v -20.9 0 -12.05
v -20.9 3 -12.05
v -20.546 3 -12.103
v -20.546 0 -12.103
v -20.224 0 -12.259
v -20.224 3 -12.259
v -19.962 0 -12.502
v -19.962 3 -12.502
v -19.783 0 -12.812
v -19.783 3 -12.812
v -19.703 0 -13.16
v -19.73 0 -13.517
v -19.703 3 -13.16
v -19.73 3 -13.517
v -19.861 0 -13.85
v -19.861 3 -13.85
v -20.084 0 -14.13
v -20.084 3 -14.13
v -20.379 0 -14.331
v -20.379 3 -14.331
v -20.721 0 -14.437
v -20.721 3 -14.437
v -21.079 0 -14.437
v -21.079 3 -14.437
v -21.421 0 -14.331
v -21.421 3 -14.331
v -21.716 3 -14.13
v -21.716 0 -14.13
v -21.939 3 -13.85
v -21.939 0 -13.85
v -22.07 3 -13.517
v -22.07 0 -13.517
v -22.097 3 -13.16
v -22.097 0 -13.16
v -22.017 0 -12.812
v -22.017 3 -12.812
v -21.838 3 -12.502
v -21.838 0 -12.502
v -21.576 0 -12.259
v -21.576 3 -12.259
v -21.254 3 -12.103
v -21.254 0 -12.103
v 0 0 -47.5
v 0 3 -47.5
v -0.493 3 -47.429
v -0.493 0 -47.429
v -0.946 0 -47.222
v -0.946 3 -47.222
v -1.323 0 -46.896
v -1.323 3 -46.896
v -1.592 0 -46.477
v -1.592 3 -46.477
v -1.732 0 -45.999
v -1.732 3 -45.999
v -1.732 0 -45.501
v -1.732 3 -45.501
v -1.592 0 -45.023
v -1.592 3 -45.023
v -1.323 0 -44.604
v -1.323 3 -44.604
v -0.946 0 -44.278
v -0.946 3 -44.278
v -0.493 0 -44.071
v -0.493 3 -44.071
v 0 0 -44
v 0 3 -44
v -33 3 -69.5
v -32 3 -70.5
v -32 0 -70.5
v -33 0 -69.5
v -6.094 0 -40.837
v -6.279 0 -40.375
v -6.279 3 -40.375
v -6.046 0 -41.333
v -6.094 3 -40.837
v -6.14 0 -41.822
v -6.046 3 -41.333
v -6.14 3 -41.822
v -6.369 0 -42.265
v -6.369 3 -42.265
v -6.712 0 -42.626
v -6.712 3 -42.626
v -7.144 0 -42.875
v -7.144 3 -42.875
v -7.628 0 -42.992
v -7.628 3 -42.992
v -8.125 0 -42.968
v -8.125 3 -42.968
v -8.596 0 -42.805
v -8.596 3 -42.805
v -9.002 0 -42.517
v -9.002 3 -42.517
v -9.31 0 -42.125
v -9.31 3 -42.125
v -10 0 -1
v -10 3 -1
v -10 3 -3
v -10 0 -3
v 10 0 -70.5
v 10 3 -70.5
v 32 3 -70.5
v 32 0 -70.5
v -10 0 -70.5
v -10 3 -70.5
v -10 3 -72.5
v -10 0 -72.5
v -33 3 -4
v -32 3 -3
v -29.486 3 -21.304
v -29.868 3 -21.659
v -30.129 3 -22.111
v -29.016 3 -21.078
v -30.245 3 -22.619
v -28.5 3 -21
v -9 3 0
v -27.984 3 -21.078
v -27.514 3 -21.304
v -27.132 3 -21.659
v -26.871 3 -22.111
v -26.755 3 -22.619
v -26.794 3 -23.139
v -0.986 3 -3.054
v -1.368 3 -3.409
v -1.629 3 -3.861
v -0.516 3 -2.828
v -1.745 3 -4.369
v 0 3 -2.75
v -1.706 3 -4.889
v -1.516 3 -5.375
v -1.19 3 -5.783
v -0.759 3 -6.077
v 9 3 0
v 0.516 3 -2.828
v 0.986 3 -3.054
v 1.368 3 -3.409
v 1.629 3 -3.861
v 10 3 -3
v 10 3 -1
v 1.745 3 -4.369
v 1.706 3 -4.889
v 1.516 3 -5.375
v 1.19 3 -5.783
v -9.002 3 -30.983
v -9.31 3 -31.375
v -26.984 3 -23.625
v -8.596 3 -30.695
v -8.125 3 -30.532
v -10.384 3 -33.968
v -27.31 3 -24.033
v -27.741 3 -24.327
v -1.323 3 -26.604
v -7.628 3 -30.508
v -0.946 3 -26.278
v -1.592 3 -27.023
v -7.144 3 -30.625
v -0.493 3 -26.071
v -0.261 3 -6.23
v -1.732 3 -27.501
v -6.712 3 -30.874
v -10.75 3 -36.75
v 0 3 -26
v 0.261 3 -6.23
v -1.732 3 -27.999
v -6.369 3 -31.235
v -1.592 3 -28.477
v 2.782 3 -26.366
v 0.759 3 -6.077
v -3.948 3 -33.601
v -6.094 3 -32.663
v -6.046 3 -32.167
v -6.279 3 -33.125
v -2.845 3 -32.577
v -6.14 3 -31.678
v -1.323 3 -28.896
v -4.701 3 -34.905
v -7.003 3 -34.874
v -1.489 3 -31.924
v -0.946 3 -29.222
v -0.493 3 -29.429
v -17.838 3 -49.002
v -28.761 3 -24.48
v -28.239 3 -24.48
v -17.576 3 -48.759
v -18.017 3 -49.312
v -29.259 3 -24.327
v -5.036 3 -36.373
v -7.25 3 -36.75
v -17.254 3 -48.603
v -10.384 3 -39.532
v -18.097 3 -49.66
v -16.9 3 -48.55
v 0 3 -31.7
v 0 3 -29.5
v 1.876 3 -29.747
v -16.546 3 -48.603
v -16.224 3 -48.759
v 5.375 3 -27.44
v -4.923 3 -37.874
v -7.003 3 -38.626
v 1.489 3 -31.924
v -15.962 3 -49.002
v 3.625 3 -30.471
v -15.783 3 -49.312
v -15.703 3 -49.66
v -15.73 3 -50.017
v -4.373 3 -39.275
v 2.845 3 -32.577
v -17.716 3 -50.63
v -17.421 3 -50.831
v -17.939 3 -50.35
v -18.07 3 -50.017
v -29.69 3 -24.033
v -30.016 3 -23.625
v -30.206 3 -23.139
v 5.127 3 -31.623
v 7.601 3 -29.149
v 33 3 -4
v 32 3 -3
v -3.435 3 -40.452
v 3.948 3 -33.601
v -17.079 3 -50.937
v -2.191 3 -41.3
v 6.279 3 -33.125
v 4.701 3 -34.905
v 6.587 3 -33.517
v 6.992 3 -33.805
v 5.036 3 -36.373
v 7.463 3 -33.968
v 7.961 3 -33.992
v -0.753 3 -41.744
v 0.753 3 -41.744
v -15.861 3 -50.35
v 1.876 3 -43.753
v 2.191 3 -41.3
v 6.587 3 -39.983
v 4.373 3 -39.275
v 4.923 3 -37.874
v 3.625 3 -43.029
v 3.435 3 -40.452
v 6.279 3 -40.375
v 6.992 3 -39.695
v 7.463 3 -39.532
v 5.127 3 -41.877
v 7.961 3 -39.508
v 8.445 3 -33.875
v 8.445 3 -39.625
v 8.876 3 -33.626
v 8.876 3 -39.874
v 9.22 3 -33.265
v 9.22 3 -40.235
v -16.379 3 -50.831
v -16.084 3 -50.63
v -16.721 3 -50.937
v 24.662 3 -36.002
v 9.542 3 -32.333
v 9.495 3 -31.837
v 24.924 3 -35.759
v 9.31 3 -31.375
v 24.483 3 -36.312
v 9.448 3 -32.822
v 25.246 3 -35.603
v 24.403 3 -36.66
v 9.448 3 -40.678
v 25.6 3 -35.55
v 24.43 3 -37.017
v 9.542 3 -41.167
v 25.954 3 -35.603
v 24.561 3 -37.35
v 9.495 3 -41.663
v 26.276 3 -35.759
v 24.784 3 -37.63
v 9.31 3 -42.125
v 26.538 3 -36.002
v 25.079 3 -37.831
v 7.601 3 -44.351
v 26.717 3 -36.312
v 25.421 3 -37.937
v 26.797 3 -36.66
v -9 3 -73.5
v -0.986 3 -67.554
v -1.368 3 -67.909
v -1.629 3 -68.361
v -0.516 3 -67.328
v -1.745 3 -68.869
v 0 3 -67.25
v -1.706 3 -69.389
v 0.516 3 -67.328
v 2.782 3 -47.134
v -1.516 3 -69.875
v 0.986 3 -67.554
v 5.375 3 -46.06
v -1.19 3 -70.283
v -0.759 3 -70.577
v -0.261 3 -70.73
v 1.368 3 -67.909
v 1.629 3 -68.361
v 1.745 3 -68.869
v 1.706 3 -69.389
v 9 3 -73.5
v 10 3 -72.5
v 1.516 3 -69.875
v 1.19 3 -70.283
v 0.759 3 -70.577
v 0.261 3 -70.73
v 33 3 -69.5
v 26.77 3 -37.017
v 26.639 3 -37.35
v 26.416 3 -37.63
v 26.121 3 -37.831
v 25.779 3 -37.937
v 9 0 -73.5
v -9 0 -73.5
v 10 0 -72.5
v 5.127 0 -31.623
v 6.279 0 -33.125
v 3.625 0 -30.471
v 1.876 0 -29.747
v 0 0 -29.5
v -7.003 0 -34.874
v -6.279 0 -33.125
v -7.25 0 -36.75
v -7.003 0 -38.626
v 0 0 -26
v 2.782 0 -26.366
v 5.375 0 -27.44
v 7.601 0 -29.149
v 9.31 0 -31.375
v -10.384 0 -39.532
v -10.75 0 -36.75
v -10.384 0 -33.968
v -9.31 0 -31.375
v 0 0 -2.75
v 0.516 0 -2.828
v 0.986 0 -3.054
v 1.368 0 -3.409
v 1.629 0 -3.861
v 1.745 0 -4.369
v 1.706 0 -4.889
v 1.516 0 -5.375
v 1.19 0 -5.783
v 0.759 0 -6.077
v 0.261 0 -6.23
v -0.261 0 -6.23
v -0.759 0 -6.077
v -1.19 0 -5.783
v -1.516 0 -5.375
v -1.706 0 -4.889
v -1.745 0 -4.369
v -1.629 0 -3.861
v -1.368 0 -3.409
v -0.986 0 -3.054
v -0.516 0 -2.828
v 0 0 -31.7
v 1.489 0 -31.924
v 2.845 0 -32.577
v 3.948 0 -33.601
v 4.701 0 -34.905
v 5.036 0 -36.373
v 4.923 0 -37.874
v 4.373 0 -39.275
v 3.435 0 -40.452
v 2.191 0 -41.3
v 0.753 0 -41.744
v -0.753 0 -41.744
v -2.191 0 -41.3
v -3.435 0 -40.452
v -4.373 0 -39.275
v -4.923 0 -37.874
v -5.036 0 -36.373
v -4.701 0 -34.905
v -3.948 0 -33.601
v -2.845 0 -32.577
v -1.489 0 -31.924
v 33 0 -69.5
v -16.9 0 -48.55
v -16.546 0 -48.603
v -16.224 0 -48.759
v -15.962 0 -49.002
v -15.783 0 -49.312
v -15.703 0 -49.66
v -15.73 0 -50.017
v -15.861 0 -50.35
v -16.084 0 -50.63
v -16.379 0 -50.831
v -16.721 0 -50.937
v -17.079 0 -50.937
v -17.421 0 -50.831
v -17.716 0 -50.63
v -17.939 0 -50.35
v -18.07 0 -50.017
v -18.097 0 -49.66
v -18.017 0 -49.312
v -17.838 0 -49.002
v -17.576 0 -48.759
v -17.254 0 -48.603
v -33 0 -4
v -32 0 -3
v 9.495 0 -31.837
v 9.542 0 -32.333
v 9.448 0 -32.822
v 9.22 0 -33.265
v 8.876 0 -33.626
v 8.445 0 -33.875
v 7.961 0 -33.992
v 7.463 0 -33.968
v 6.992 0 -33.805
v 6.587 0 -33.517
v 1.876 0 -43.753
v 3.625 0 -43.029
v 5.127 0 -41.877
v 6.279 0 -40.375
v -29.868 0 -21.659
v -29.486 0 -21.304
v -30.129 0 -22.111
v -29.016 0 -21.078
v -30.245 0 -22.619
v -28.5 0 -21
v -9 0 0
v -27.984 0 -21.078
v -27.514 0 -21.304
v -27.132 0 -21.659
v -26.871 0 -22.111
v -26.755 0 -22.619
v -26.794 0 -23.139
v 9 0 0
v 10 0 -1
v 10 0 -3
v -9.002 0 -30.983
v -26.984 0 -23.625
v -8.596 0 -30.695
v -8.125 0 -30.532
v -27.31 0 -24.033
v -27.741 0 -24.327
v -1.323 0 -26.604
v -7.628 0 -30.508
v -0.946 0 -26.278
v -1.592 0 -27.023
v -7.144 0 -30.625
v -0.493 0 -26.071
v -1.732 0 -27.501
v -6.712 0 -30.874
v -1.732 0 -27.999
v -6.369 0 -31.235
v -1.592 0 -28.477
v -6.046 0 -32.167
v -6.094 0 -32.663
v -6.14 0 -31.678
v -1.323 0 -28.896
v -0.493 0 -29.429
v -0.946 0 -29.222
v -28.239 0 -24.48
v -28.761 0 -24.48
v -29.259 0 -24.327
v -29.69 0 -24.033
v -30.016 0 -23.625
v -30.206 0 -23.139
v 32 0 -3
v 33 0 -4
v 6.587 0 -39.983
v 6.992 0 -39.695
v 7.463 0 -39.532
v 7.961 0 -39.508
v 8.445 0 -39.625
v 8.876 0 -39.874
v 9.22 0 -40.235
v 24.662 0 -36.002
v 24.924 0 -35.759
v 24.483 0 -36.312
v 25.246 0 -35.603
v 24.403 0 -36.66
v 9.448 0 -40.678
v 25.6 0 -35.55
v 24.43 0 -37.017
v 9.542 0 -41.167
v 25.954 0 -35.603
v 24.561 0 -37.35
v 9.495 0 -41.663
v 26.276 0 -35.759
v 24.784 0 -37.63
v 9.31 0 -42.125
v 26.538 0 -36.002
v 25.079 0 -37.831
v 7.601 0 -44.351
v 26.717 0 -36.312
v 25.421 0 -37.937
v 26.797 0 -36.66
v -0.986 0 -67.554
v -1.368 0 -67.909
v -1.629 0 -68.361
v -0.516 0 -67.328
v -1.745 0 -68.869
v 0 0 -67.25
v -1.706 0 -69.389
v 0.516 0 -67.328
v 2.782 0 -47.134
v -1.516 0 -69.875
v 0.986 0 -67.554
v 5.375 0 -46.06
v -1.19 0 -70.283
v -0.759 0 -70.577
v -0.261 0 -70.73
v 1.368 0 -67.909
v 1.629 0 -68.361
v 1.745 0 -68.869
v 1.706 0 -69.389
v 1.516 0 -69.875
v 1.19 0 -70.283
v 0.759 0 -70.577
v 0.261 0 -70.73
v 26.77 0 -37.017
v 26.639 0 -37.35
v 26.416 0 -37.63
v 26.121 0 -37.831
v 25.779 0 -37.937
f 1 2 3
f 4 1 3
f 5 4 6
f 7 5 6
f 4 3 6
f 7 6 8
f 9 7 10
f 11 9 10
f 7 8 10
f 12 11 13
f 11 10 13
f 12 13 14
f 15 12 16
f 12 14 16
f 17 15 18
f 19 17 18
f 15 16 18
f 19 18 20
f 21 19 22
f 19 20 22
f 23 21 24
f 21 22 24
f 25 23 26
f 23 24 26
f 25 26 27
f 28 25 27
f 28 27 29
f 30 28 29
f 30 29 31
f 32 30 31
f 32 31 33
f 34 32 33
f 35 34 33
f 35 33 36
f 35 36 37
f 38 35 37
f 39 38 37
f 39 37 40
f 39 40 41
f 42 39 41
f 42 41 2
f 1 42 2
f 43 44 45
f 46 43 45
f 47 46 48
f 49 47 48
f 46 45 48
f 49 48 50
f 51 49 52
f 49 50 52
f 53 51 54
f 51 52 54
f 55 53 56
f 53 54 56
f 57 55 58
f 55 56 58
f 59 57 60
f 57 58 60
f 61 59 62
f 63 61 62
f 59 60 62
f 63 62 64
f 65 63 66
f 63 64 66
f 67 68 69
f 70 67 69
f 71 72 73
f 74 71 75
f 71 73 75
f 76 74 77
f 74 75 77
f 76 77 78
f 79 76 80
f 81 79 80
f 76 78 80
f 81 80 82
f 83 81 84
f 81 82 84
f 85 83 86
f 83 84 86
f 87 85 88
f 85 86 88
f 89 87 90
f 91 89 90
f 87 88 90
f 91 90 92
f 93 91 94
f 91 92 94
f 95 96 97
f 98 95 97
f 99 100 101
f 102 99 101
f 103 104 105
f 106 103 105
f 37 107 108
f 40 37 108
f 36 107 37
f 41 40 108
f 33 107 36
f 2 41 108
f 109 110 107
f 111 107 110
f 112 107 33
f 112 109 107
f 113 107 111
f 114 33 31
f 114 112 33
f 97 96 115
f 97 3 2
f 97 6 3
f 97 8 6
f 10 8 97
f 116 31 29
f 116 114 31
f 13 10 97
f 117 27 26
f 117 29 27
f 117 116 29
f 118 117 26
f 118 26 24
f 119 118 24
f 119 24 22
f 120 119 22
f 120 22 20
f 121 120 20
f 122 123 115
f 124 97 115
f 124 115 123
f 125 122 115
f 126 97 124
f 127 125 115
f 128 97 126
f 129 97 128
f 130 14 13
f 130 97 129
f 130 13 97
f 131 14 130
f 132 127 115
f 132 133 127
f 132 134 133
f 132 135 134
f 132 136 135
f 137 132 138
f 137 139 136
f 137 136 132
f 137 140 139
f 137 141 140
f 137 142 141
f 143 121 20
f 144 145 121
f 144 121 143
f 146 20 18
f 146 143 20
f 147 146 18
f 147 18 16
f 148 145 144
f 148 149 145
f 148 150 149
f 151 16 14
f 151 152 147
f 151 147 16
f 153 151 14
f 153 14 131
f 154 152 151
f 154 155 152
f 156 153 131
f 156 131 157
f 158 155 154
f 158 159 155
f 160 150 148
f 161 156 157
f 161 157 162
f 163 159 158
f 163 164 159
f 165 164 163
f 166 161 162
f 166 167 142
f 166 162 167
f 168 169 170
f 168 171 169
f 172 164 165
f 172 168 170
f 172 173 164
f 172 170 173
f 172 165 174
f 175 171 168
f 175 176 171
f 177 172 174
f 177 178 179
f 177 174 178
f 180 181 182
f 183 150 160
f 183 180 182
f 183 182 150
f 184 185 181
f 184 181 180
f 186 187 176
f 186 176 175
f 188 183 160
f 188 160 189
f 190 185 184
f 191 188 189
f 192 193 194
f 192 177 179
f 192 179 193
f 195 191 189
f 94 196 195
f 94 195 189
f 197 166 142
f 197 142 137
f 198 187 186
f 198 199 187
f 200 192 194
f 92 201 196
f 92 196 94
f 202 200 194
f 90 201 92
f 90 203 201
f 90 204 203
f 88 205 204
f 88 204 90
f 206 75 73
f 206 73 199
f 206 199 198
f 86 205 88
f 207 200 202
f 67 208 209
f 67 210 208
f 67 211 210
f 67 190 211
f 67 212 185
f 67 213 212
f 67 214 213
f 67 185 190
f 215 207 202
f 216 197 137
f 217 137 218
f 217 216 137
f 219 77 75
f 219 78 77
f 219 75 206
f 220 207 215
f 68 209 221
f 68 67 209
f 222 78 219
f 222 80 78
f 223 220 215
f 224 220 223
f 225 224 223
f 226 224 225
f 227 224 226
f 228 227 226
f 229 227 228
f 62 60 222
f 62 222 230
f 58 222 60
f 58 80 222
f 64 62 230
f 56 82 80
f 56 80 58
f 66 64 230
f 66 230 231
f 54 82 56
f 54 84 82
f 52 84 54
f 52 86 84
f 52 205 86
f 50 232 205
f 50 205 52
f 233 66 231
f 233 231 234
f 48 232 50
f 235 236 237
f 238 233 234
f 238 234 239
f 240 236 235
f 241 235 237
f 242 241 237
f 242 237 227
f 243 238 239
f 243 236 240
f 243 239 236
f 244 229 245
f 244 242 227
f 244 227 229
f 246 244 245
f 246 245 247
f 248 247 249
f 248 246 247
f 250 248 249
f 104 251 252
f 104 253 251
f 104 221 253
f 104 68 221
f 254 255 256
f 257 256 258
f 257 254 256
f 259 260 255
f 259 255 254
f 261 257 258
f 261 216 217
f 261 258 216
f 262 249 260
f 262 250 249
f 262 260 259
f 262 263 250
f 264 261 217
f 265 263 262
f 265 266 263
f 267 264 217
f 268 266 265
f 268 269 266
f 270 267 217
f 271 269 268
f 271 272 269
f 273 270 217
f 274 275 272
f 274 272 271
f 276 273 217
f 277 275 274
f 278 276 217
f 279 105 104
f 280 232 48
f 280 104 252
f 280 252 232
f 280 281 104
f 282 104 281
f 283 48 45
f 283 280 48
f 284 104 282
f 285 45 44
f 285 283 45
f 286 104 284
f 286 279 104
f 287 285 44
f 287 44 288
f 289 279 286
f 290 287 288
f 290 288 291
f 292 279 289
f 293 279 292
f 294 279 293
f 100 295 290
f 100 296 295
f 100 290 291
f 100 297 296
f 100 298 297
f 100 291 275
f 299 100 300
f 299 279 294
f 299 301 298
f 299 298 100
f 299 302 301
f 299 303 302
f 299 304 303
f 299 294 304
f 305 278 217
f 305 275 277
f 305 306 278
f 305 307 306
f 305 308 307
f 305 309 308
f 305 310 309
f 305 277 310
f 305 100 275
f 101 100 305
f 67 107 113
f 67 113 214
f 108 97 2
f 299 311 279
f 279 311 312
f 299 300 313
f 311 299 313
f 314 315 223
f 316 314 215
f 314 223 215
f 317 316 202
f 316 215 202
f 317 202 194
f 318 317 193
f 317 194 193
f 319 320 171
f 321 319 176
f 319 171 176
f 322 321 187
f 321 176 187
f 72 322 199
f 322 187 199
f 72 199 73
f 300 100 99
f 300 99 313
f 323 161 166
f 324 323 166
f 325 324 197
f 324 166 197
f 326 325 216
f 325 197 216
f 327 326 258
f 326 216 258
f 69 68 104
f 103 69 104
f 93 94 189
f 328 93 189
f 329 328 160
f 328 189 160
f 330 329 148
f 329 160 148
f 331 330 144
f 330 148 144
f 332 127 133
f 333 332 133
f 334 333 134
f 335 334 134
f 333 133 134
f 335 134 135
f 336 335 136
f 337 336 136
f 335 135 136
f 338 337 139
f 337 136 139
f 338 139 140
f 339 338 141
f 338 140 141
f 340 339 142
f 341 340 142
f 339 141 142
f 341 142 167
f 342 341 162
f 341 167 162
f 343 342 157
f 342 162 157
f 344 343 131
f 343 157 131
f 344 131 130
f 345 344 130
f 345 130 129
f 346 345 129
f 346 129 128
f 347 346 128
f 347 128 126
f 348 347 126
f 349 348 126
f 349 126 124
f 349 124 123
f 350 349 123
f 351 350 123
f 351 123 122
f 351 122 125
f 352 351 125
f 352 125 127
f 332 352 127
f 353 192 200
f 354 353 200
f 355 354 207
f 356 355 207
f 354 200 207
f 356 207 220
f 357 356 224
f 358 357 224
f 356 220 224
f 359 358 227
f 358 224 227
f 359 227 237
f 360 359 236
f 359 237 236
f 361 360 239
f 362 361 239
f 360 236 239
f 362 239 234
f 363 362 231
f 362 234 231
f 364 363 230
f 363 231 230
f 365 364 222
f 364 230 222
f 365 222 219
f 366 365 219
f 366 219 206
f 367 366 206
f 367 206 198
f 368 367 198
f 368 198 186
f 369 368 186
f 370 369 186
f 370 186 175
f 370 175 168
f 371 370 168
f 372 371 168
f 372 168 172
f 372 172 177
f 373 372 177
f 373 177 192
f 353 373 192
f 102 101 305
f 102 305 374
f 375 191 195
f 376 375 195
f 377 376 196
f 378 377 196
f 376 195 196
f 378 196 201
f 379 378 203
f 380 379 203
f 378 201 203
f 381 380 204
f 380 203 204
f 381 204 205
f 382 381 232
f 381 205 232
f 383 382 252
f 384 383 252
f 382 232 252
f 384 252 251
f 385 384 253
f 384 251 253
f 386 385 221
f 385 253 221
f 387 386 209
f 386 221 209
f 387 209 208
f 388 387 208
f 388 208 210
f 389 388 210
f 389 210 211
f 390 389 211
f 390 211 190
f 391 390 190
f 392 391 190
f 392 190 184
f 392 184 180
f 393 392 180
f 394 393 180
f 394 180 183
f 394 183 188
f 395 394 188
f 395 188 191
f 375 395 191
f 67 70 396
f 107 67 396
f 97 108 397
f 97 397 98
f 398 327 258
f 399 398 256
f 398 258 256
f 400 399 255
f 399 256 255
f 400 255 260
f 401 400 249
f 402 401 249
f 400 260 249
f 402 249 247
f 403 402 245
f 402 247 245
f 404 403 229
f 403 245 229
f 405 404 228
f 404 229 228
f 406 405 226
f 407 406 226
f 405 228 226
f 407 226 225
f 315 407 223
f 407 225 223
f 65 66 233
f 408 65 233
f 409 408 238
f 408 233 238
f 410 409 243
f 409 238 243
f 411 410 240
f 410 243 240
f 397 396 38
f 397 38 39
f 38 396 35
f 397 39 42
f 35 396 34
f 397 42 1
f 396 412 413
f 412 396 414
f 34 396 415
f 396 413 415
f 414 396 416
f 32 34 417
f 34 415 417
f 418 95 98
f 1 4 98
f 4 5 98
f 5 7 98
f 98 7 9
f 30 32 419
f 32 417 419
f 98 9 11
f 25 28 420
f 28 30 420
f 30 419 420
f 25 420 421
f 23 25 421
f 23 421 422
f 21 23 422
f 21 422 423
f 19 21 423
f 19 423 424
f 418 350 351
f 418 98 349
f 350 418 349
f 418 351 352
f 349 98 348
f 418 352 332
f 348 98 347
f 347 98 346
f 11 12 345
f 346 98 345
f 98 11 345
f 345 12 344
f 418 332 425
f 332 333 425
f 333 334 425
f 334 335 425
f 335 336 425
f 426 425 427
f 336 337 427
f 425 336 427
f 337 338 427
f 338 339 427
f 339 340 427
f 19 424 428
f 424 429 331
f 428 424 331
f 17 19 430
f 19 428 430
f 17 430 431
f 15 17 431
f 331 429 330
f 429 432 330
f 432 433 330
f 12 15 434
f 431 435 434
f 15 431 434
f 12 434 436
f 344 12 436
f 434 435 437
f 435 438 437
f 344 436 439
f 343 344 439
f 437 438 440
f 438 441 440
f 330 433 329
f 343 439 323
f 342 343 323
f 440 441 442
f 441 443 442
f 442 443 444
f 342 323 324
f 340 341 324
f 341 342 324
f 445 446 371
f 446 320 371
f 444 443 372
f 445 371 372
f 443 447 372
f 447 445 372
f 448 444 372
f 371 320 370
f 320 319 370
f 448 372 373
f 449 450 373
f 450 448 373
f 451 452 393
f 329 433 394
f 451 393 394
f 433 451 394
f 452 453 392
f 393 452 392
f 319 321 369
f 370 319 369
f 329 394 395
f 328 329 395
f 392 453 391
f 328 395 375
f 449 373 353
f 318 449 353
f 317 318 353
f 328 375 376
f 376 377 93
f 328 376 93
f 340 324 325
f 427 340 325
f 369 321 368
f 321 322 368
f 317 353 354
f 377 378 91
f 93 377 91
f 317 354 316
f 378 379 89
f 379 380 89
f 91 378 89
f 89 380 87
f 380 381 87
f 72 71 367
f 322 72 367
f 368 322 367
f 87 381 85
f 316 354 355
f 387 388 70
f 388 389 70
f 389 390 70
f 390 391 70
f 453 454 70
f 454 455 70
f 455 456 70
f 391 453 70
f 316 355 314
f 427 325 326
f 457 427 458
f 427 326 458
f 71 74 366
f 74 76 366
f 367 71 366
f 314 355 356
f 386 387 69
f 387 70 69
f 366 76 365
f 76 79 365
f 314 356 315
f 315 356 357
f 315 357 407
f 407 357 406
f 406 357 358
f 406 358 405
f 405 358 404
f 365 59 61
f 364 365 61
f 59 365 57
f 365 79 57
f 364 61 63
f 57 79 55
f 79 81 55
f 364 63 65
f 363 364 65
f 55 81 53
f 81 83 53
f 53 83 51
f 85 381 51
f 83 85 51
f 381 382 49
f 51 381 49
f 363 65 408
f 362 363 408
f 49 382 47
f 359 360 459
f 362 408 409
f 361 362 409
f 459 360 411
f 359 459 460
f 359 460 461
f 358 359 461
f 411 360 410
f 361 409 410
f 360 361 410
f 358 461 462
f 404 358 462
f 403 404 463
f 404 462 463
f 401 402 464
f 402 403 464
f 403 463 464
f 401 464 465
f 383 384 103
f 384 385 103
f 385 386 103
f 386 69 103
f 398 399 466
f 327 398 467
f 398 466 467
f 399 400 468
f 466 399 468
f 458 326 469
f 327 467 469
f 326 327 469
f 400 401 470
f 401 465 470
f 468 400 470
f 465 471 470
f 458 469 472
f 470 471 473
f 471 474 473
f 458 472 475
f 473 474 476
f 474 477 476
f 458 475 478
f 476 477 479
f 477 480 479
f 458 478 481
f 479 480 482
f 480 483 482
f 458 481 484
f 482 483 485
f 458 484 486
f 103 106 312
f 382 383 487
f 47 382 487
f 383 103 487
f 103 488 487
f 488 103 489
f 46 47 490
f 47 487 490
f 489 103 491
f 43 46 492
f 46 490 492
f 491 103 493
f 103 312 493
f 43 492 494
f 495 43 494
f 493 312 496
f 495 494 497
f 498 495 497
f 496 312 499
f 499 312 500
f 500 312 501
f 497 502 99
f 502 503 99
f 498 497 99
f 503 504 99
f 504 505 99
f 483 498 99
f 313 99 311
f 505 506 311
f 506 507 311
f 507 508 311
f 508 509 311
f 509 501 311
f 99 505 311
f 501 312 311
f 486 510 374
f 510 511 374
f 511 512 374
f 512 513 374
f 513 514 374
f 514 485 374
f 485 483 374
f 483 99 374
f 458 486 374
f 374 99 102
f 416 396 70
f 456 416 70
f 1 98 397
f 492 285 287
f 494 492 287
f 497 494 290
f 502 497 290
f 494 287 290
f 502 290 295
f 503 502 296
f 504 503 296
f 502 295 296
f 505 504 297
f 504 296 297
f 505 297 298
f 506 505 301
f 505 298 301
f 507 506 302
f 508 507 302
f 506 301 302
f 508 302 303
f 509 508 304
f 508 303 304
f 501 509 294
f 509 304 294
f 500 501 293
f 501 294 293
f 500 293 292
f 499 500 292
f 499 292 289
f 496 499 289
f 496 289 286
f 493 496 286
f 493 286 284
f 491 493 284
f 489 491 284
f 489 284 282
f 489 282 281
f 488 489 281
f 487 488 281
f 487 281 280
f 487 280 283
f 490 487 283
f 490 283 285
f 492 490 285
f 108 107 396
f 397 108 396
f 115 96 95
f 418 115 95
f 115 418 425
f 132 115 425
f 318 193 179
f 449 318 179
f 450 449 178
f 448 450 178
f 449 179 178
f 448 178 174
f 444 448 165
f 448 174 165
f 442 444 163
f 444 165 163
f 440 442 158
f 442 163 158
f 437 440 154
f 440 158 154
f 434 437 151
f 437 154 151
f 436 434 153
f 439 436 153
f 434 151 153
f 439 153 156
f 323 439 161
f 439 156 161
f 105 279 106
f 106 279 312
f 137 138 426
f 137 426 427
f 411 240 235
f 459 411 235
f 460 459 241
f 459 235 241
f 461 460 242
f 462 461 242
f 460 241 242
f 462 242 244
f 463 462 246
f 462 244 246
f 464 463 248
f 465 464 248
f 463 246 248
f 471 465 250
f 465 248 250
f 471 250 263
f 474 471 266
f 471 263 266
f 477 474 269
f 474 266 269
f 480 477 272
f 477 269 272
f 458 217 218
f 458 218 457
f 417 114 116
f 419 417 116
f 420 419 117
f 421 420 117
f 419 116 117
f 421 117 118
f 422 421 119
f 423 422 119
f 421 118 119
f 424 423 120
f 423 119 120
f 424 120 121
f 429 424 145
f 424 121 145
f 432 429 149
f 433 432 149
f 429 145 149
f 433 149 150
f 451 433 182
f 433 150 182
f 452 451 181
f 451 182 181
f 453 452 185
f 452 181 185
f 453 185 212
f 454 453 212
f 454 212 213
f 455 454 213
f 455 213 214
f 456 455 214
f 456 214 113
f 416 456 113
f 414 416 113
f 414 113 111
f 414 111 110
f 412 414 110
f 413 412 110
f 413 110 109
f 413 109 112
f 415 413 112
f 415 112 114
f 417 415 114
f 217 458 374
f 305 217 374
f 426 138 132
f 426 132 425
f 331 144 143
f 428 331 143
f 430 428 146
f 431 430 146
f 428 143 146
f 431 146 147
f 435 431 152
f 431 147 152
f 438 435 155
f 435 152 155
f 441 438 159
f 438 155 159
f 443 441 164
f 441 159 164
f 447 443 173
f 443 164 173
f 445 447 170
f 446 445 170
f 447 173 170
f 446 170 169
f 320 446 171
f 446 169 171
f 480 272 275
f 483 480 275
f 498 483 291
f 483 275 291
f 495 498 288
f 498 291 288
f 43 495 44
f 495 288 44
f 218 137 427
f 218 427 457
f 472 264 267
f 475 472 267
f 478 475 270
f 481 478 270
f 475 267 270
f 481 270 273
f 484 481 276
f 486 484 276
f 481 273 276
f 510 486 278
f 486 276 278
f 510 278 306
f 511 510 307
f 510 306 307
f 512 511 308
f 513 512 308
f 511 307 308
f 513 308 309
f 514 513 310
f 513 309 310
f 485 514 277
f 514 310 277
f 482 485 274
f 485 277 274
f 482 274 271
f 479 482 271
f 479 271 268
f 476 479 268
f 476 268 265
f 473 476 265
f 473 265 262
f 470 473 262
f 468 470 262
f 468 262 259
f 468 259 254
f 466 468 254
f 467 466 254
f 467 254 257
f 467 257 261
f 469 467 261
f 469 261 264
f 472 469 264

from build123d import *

# Parameters (mm, degrees)
BOSS_EXTRUDE1_DEPTH   = 3
CROQUIS13_W           = 23
CROQUIS13_H           = 3
CORTAR_EXTRUIR3_DEPTH = 81.624127902
CUT_EXTRUDE1_REACH    = 82.624
SKETCH3_R             = 1.2
SKETCH3_R_2           = 5.05
SKETCH3_R_3           = 1.75
CHAFL_N3_SIZE         = 1
CORTAR_EXTRUIR2_DEPTH = 81.624127902


with BuildPart() as part:
    # Sketch1 → Boss-Extrude1 (new body)
    with BuildSketch(Plane(origin=(0, 0, 0), x_dir=(1, 0, 0), z_dir=(0, 1, 0))):
        Polygon((-33, 27.237606732), (-33, 0), (33, 0), (33, 73.5), (-33, 73.5), align=None)
    extrude(amount=BOSS_EXTRUDE1_DEPTH)

    # Croquis13 → Cortar-Extruir3 (cut, through all)
    with BuildSketch(Plane(origin=(0, 3, 0), x_dir=(1, 0, 0), z_dir=(0, 1, 0))):
        with Locations((-21.5, 72)):
            Rectangle(CROQUIS13_W, CROQUIS13_H)
        with Locations((21.5, 72)):
            Rectangle(CROQUIS13_W, CROQUIS13_H)
        with Locations((-21.5, 1.5)):
            Rectangle(CROQUIS13_W, CROQUIS13_H)
        with Locations((21.5, 1.5)):
            Rectangle(CROQUIS13_W, CROQUIS13_H)
    extrude(amount=-CORTAR_EXTRUIR3_DEPTH, mode=Mode.SUBTRACT)

    # Sketch3 → Cut-Extrude1 (cut, up to next)
    with BuildSketch(Plane(origin=(0, 3, 0), x_dir=(1, 0, 0), z_dir=(0, 1, 0)), mode=Mode.PRIVATE) as cut_extrude1_sk1:
        with Locations(Location((-20.9, 13.25, 0), (0, 0, 270))):
            Circle(SKETCH3_R)
    cut_extrude1_tool1 = extrude(cut_extrude1_sk1.sketch, amount=-CUT_EXTRUDE1_REACH, mode=Mode.PRIVATE) & part.part
    # Sketch3 → Cut-Extrude1 (cut, up to next)
    with BuildSketch(Plane(origin=(0, 3, 0), x_dir=(1, 0, 0), z_dir=(0, 1, 0)), mode=Mode.PRIVATE) as cut_extrude1_sk2:
        with Locations(Location((0, 36.75, 0), (0, 0, 270))):
            Circle(SKETCH3_R_2)
    cut_extrude1_tool2 = extrude(cut_extrude1_sk2.sketch, amount=-CUT_EXTRUDE1_REACH, mode=Mode.PRIVATE) & part.part
    # Sketch3 → Cut-Extrude1 (cut, up to next)
    with BuildSketch(Plane(origin=(0, 3, 0), x_dir=(1, 0, 0), z_dir=(0, 1, 0)), mode=Mode.PRIVATE) as cut_extrude1_sk3:
        with Locations(Location((-16.9, 49.75, 0), (0, 0, 270))):
            Circle(SKETCH3_R)
    cut_extrude1_tool3 = extrude(cut_extrude1_sk3.sketch, amount=-CUT_EXTRUDE1_REACH, mode=Mode.PRIVATE) & part.part
    # Sketch3 → Cut-Extrude1 (cut, up to next)
    with BuildSketch(Plane(origin=(0, 3, 0), x_dir=(1, 0, 0), z_dir=(0, 1, 0)), mode=Mode.PRIVATE) as cut_extrude1_sk4:
        with Locations(Location((25.6, 36.75, 0), (0, 0, 270))):
            Circle(SKETCH3_R)
    cut_extrude1_tool4 = extrude(cut_extrude1_sk4.sketch, amount=-CUT_EXTRUDE1_REACH, mode=Mode.PRIVATE) & part.part
    # Sketch3 → Cut-Extrude1 (cut, up to next)
    with BuildSketch(Plane(origin=(0, 3, 0), x_dir=(1, 0, 0), z_dir=(0, 1, 0)), mode=Mode.PRIVATE) as cut_extrude1_sk5:
        with Locations(Location((0, 4.5, 0), (0, 0, 270))):
            Circle(SKETCH3_R_3)
    cut_extrude1_tool5 = extrude(cut_extrude1_sk5.sketch, amount=-CUT_EXTRUDE1_REACH, mode=Mode.PRIVATE) & part.part
    # Sketch3 → Cut-Extrude1 (cut, up to next)
    with BuildSketch(Plane(origin=(0, 3, 0), x_dir=(1, 0, 0), z_dir=(0, 1, 0)), mode=Mode.PRIVATE) as cut_extrude1_sk6:
        with Locations(Location((0, 69, 0), (0, 0, 270))):
            Circle(SKETCH3_R_3)
    cut_extrude1_tool6 = extrude(cut_extrude1_sk6.sketch, amount=-CUT_EXTRUDE1_REACH, mode=Mode.PRIVATE) & part.part
    # Sketch3 → Cut-Extrude1 (cut, up to next)
    with BuildSketch(Plane(origin=(0, 3, 0), x_dir=(1, 0, 0), z_dir=(0, 1, 0)), mode=Mode.PRIVATE) as cut_extrude1_sk7:
        with Locations(Location((-28.5, 22.75, 0), (0, 0, 270))):
            Circle(SKETCH3_R_3)
    cut_extrude1_tool7 = extrude(cut_extrude1_sk7.sketch, amount=-CUT_EXTRUDE1_REACH, mode=Mode.PRIVATE) & part.part
    add(cut_extrude1_tool1.solids().sort_by_distance((-20.9, 3, -13.25))[0], mode=Mode.SUBTRACT)
    add(cut_extrude1_tool2.solids().sort_by_distance((0, 3, -36.75))[0], mode=Mode.SUBTRACT)
    add(cut_extrude1_tool3.solids().sort_by_distance((-16.9, 3, -49.75))[0], mode=Mode.SUBTRACT)
    add(cut_extrude1_tool4.solids().sort_by_distance((25.6, 3, -36.75))[0], mode=Mode.SUBTRACT)
    add(cut_extrude1_tool5.solids().sort_by_distance((0, 3, -4.5))[0], mode=Mode.SUBTRACT)
    add(cut_extrude1_tool6.solids().sort_by_distance((0, 3, -69))[0], mode=Mode.SUBTRACT)
    add(cut_extrude1_tool7.solids().sort_by_distance((-28.5, 3, -22.75))[0], mode=Mode.SUBTRACT)

    # Chaflán3
    chafl_n3_edges = [part.edges().sort_by_distance(p)[0] for p in [
        (-33, 1.5, -70.5),
        (-10, 1.5, -73.5),
        (33, 1.5, -70.5),
        (10, 1.5, -73.5),
        (-33, 1.5, -3),
        (-10, 1.5, 0),
        (33, 1.5, -3),
        (10, 1.5, 0),
    ]]
    chamfer(chafl_n3_edges, length=CHAFL_N3_SIZE)

    # Croquis12 → Cortar-Extruir2 (cut, through all)
    with BuildSketch(Plane(origin=(0, 3, 0), x_dir=(1, 0, 0), z_dir=(0, 1, 0))):
        with BuildLine():
            ThreePointArc((-9.309773091, 42.125), (-10.75, 36.75), (-9.309773091, 31.375))
            ThreePointArc((-9.309773091, 31.375), (-6.919228634, 30.734455543), (-6.278684177, 33.125))
            ThreePointArc((-6.278684177, 33.125), (-7.25, 36.75), (-6.278684177, 40.375))
            ThreePointArc((-6.278684177, 40.375), (-6.919228634, 42.765544457), (-9.309773091, 42.125))
        make_face()
        with BuildLine():
            ThreePointArc((9.309773091, 42.125), (5.375, 46.059773091), (0, 47.5))
            ThreePointArc((0, 47.5), (-1.75, 45.75), (0, 44))
            ThreePointArc((0, 44), (3.625, 43.028684177), (6.278684177, 40.375))
            ThreePointArc((6.278684177, 40.375), (8.669228634, 39.734455543), (9.309773091, 42.125))
        make_face()
        with BuildLine():
            ThreePointArc((0, 26), (5.375, 27.440226909), (9.309773091, 31.375))
            ThreePointArc((9.309773091, 31.375), (8.669228634, 33.765544457), (6.278684177, 33.125))
            ThreePointArc((6.278684177, 33.125), (3.625, 30.471315823), (0, 29.5))
            ThreePointArc((0, 29.5), (-1.75, 27.75), (0, 26))
        make_face()
    extrude(amount=-CORTAR_EXTRUIR2_DEPTH, mode=Mode.SUBTRACT)


solid = part.part
